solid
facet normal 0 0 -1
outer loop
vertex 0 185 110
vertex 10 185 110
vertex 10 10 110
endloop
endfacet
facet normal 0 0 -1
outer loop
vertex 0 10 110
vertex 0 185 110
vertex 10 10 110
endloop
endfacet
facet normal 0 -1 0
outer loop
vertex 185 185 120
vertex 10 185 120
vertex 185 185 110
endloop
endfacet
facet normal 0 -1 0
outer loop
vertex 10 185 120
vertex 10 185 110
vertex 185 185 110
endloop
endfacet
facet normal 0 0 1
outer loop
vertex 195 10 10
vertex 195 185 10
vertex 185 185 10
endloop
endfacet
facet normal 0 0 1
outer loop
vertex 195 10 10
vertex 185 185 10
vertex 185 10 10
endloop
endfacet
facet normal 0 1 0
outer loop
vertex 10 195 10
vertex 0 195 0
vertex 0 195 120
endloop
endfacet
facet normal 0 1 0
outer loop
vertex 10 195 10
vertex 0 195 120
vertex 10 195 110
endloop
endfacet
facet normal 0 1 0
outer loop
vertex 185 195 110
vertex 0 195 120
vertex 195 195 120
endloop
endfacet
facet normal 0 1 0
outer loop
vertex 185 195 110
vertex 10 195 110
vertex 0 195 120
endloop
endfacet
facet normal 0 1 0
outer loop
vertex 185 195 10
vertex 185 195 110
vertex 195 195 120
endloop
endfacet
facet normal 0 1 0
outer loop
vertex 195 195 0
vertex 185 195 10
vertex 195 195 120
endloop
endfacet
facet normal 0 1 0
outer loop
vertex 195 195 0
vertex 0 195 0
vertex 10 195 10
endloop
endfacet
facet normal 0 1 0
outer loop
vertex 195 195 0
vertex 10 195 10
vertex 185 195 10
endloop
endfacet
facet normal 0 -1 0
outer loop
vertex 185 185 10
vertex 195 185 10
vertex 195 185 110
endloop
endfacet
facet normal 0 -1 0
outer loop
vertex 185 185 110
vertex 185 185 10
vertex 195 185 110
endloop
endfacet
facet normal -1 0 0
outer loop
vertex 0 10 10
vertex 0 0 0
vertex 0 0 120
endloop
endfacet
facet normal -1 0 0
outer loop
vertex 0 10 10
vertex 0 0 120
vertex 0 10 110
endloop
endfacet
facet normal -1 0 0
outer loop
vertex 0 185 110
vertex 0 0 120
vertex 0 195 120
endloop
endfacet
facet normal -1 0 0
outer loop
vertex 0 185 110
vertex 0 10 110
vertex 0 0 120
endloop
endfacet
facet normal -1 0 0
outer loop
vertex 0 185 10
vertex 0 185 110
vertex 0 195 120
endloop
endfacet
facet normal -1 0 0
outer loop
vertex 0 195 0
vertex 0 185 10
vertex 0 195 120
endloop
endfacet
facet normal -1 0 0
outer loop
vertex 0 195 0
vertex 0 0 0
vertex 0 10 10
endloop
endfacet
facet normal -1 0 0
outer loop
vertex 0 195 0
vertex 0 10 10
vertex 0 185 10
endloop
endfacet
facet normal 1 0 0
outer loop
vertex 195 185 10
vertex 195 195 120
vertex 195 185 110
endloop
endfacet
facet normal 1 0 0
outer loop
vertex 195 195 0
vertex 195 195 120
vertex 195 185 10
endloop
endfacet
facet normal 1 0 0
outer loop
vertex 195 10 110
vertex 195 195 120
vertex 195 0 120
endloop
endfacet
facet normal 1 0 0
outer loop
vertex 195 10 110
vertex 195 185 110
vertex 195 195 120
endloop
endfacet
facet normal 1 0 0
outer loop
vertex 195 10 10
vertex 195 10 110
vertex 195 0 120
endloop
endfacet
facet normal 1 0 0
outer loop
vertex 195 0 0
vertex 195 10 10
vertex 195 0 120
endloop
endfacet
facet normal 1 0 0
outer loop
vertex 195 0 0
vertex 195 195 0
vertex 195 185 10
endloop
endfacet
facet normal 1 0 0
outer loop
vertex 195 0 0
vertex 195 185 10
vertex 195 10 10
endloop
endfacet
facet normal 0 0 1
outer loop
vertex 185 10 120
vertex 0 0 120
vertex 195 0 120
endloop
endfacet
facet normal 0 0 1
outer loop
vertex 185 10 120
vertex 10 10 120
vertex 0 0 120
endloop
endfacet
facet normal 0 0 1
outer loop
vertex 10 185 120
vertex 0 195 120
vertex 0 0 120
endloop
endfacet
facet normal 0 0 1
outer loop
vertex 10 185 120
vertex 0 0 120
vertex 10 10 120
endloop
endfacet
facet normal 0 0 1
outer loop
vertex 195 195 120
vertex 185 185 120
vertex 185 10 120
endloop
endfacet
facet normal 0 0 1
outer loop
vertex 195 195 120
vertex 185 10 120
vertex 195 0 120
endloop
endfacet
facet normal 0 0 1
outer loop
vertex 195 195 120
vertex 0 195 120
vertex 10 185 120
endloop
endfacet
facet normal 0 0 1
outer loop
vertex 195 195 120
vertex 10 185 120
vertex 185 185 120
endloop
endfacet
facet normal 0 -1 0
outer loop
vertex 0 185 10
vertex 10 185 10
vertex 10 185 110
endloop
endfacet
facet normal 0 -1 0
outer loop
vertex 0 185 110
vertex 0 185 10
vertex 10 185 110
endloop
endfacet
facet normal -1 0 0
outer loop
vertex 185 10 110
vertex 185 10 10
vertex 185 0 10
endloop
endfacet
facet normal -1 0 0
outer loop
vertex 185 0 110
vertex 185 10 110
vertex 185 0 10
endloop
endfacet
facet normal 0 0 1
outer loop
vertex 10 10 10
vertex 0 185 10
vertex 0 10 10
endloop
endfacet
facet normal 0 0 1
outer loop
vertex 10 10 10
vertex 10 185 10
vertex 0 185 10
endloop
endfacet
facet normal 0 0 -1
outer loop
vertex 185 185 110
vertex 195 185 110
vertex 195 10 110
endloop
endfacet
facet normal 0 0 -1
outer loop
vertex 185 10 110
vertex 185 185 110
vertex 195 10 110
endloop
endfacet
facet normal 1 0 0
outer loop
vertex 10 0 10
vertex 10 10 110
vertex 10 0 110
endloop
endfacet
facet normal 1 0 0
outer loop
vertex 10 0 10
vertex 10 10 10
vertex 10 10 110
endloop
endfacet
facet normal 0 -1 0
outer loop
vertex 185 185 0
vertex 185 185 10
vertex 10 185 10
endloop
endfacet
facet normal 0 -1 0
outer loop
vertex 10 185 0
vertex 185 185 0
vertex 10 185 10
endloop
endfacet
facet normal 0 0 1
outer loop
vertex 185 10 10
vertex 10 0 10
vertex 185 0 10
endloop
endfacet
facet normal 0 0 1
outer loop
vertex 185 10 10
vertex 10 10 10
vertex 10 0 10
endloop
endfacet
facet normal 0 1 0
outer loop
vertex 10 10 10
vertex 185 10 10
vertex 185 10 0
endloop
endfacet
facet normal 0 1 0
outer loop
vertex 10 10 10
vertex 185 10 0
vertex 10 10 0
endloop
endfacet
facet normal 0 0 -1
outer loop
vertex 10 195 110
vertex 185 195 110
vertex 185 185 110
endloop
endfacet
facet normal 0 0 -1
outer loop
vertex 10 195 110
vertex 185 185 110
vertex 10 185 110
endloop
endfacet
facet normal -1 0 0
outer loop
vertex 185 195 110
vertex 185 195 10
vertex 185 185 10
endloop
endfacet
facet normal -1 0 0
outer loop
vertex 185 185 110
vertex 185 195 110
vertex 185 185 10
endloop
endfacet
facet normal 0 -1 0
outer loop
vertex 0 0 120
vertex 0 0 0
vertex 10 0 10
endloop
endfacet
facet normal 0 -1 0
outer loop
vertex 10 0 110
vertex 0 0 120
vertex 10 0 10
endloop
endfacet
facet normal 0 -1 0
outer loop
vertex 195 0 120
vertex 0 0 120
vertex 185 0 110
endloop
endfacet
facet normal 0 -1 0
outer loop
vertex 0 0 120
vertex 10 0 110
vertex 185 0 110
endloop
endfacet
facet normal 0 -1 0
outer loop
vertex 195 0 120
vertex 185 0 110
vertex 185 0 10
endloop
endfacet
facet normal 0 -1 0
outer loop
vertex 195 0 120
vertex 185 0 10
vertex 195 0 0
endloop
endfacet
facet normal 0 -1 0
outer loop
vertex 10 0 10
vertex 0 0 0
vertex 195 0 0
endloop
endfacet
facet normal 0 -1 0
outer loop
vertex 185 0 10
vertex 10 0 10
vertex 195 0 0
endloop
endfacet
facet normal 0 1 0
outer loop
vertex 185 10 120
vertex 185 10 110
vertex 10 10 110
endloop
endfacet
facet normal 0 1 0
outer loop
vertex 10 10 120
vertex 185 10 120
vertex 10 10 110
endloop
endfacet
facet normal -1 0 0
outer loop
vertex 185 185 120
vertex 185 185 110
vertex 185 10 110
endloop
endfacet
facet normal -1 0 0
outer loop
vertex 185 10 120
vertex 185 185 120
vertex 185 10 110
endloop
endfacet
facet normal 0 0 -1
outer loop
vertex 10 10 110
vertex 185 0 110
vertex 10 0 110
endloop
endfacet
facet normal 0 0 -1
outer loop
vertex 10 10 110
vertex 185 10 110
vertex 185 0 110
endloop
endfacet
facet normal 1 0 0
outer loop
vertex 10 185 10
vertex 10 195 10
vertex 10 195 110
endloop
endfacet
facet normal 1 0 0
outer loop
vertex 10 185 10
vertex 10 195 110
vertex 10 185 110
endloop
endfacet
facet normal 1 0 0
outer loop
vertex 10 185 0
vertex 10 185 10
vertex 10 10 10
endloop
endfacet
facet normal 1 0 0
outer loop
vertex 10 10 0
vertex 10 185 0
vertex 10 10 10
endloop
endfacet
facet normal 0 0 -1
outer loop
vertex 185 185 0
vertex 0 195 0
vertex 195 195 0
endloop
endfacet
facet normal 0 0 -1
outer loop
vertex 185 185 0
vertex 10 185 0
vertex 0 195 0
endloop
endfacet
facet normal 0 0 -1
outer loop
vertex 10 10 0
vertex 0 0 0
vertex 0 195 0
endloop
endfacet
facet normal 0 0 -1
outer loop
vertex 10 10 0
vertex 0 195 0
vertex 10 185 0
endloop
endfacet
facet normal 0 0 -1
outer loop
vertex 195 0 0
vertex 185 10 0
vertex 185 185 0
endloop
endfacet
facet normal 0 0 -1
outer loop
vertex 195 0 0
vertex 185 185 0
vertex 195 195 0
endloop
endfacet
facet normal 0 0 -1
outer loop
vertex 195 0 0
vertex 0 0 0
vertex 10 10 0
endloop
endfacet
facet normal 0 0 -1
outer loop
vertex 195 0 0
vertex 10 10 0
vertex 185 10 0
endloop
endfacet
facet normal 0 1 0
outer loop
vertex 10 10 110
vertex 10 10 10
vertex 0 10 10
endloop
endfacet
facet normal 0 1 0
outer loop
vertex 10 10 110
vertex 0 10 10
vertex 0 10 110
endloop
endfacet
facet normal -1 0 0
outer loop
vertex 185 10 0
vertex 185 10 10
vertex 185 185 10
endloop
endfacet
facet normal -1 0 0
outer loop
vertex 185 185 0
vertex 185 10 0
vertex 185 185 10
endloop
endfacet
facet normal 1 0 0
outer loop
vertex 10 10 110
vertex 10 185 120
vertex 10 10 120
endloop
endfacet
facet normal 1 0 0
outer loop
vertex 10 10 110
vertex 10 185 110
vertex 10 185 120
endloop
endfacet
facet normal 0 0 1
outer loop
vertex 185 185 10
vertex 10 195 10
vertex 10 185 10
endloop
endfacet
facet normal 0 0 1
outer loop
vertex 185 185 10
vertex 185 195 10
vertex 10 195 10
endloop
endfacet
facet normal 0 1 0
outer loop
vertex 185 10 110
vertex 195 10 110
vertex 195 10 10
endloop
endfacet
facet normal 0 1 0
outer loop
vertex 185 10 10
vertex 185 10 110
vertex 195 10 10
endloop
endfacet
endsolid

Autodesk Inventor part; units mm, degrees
ref_plane "YZ Plane" through (0, 0, 0) normal (1, 0, 0) x (0, 1, 0)
ref_plane "XZ Plane" through (0, 0, 0) normal (0, 1, 0) x (-1, 0, 0)
ref_plane "XY Plane" through (0, 0, 0) normal (0, 0, 1) x (1, 0, 0)
sketch "Sketch1" plane through (0, 0, 0) normal (0, 0, 1) x (1, 0, 0)
  line L0 (0, 0) -> (175, 0)
  line L1 (175, 0) -> (175, 175)
  line L2 (175, 175) -> (0, 175)
  line L3 (0, 175) -> (0, 0)
  dimension "d0" = 175
  dimension "d1" = 175
extrude "Extrusion1" add sketch "Sketch1" along normal blind 100
sketch "Sketch2" plane through (0, 175, 0) normal (0, 1, 0) x (1, 0, 0)
  line L0 (0, 0) -> (175, 0) projected
  line L1 (0, -100) -> (175, -100) projected
  line L2 (0, 0) -> (175, 0)
  line L3 (175, 0) -> (175, -100)
  line L4 (175, -100) -> (0, -100)
  line L5 (0, -100) -> (0, 0)
  line L6 (10, -10) -> (165, -10)
  line L7 (165, -10) -> (165, -90)
  line L8 (165, -90) -> (10, -90)
  line L9 (10, -90) -> (10, -10)
  dimension "d4" = 10
  dimension "d5" = 10
  dimension "d6" = 10
  dimension "d7" = 10
extrude "Extrusion2" add sketch "Sketch2" along normal blind 10
sketch "Sketch3" plane through (10, 175, 10) normal (0, 1, 0) x (1, 0, 0)
  line L0 (0, -80) -> (0, 0) projected
  line L1 (0, -80) -> (155, -80) projected
  line L2 (0, 0) -> (155, 0)
  line L3 (155, 0) -> (155, -80)
  line L4 (155, -80) -> (0, -80)
  line L5 (0, -80) -> (0, 0)
  point P0 (-10, 10)
extrude "Extrusion3" cut sketch "Sketch3" against normal blind 9000
sketch "Sketch4" plane through (0, 0, 100) normal (0, 0, 1) x (1, 0, 0)
  line L0 (175, 0) -> (175, 185) projected
  line L1 (175, 185) -> (195, 185)
  line L2 (195, 185) -> (195, 0)
  line L3 (195, 0) -> (175, 0)
  line L4 (175, 0) -> (175, 185)
  point P0 (0, 0)
  dimension "d12" = 20
extrude "Extrusion4" add sketch "Sketch4" against normal blind 100
sketch "Sketch5" plane through (0, 0, 100) normal (0, 0, 1) x (1, 0, 0)
  line L0 (10, 175) -> (185, 175)
  line L1 (185, 175) -> (185, 10)
  line L2 (185, 10) -> (10, 10)
  line L3 (10, 10) -> (10, 175)
  line L4 (0, 185) -> (195, 185) projected
  line L5 (0, 0) -> (0, 185) projected
  line L6 (0, 0) -> (195, 0) projected
  line L7 (195, 0) -> (195, 185) projected
  dimension "d15" = 10
  dimension "d16" = 10
  dimension "d17" = 10
  dimension "d18" = 10
extrude "Extrusion5" cut sketch "Sketch5" against normal blind 100 contours L0 L1 L2 L3
sketch "Sketch6" plane through (195, 0, 100) normal (1, 0, 0) x (0, 0, -1)
  point P0 (100, 0)
sketch "Sketch7" plane through (0, 185, 0) normal (0, 1, 0) x (1, 0, 0)
  line L0 (0, -100) -> (195, -100) projected
  line L1 (0, 0) -> (195, 0)
  line L2 (195, 0) -> (195, -100)
  line L3 (195, -100) -> (0, -100)
  line L4 (0, -100) -> (0, 0)
extrude "Extrusion6" add sketch "Sketch7" along normal blind 10
sketch "Sketch8" plane through (0, 195, 0) normal (0, 1, 0) x (1, 0, 0)
  line L0 (10, -10) -> (10, 0) projected
  line L1 (10, -10) -> (185, -10)
  line L2 (185, -10) -> (185, -90)
  line L3 (185, -90) -> (10, -90)
  line L4 (10, -90) -> (10, -10)
  line L5 (0, -100) -> (195, -100) projected
  line L6 (195, -100) -> (195, 0) projected
  point P0 (0, 0)
  dimension "d23" = 10
  dimension "d24" = 10
extrude "Extrusion7" cut sketch "Sketch8" against normal blind 900
sketch "Sketch9" plane through (195, 0, 100) normal (1, 0, 0) x (0, 0, -1)
  line L0 (10, 185) -> (90, 185)
  line L1 (90, 185) -> (90, 10)
  line L2 (90, 10) -> (10, 10)
  line L3 (10, 10) -> (10, 185)
  line L4 (0, 195) -> (100, 195) projected
  line L5 (0, 0) -> (0, 195) projected
  line L6 (0, 0) -> (100, 0) projected
  line L7 (100, 0) -> (100, 195) projected
  dimension "d27" = 10
  dimension "d28" = 10
  dimension "d29" = 10
  dimension "d30" = 10
extrude "Extrusion8" cut sketch "Sketch9" against normal blind 900 contours L0 L1 L2 L3
sketch "Sketch10" plane through (0, 0, 100) normal (0, 0, 1) x (1, 0, 0)
  line L0 (185, 175) -> (10, 175) projected
  line L1 (185, 195) -> (185, 185) projected
  line L2 (10, 175) -> (185, 175)
  line L3 (185, 175) -> (185, 185)
  line L4 (185, 185) -> (10, 185)
  line L5 (10, 185) -> (10, 175)
  point P0 (0, 0)
extrude "Extrusion9" cut sketch "Sketch10" against normal blind 900
sketch "Sketch11" plane through (0, 0, 100) normal (0, 0, 1) x (1, 0, 0)
  line L0 (0, 0) -> (0, 195) projected
  line L1 (0, 0) -> (195, 0) projected
  line L2 (0, 195) -> (195, 195)
  line L3 (195, 195) -> (195, 0)
  line L4 (195, 0) -> (0, 0)
  line L5 (0, 0) -> (0, 195)
  line L6 (10, 185) -> (10, 10) projected
  line L7 (185, 10) -> (10, 10) projected
  line L8 (10, 185) -> (185, 185)
  line L9 (185, 185) -> (185, 10)
  line L10 (185, 10) -> (10, 10)
  line L11 (10, 10) -> (10, 185)
extrude "Extrusion10" add sketch "Sketch11" along normal blind 20
sketch "Sketch12" plane through (0, 195, 0) normal (0, 1, 0) x (1, 0, 0)
  line L0 (10, -90) -> (0, -90) projected
  line L1 (185, -120) -> (185, -90) projected
  line L2 (10, -90) -> (185, -90)
  line L3 (185, -90) -> (185, -110)
  line L4 (185, -110) -> (10, -110)
  line L5 (10, -110) -> (10, -90)
  line L6 (195, -120) -> (0, -120) projected
  point P0 (0, 0)
  dimension "d37" = 10
extrude "Extrusion11" cut sketch "Sketch12" against normal blind 900
sketch "Sketch13" plane through (195, 0, 0) normal (1, 0, 0) x (0, 0, -1)
  line L0 (-90, 185) -> (-10, 185) projected
  line L1 (-120, 10) -> (-110, 10) projected
  line L2 (-90, 185) -> (-110, 185)
  line L3 (-110, 185) -> (-110, 10)
  line L4 (-110, 10) -> (-90, 10)
  line L5 (-90, 10) -> (-90, 185)
  point P0 (0, 0)
extrude "Extrusion12" cut sketch "Sketch13" against normal blind 900
sketch "Sketch15" plane through (0, 10, 10) normal (0, 0, 1) x (1, 0, 0)
  line L0 (10, 175) -> (10, 0) projected
  line L1 (0, 115) -> (10, 115)
  line L2 (10, 115) -> (10, 105)
  line L3 (10, 105) -> (0, 105)
  line L4 (0, 105) -> (0, 115)
  point P0 (10, 115)
  point P1 (10, 115)
  dimension "d45" = 10
sketch "Sketch16" plane through (185, 10, 10) normal (0, 0, 1) x (1, 0, 0)
  line L0 (0, 115) -> (10, 115) projected
  line L1 (0, 115) -> (10, 115)
  line L2 (10, 115) -> (10, 105)
  line L3 (10, 105) -> (0, 105)
  line L4 (0, 105) -> (0, 115)
  point P0 (-185, -10)
  point P1 (10, 115)
  dimension "d46" = 10
properties part number "Battery housing"
